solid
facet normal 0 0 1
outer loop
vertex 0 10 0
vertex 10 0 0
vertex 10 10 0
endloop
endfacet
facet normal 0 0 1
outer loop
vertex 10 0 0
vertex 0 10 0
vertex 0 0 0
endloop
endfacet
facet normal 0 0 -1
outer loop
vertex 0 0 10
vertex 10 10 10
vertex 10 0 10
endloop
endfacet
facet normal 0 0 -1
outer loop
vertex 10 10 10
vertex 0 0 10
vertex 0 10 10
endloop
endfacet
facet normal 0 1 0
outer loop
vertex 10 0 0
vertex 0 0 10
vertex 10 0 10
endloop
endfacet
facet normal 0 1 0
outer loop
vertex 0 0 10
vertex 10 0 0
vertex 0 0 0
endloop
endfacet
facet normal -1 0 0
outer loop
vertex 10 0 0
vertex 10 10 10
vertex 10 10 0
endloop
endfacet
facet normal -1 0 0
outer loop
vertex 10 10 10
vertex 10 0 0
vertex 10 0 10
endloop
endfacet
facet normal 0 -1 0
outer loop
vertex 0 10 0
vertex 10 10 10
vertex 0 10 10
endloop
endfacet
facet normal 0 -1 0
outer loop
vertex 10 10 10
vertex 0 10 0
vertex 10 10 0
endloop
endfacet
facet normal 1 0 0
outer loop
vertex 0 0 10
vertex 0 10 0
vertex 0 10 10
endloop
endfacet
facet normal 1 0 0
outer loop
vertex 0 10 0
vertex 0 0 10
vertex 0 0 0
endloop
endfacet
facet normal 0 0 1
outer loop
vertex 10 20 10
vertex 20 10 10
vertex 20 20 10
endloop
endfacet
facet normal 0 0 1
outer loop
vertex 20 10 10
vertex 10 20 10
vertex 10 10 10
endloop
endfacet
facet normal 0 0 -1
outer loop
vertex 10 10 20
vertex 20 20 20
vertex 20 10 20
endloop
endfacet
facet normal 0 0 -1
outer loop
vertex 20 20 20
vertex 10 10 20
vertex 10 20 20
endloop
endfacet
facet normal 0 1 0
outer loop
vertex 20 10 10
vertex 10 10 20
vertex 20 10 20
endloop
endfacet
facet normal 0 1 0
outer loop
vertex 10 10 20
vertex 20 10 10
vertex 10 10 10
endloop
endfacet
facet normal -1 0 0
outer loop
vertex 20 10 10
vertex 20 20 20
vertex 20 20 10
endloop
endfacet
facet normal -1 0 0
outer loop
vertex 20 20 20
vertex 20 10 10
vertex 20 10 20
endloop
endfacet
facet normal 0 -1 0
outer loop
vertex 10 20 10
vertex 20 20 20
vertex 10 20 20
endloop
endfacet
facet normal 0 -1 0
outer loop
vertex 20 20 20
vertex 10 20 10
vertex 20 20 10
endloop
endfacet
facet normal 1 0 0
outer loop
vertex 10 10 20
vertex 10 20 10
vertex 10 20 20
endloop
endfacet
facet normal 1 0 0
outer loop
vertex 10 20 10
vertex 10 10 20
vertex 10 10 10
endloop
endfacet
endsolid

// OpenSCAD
// a polyhedron that does not sew into one solid as written, built the way OpenSCAD repairs a mesh
// (one object per fixture: OpenSCAD's CGAL render refuses to union a non-manifold mesh with anything)
// two cubes meeting at one corner, each written with its own points: welded, they share that vertex
// and nothing else — two closed pieces, 2 x 1000 mm^3
polyhedron(
    points = [[0, 0, 0], [10, 0, 0], [10, 10, 0], [0, 10, 0], [0, 0, 10], [10, 0, 10], [10, 10, 10], [0, 10, 10],
              [10, 10, 10], [20, 10, 10], [20, 20, 10], [10, 20, 10], [10, 10, 20], [20, 10, 20], [20, 20, 20], [10, 20, 20]],
    faces = [[0, 3, 2, 1], [4, 5, 6, 7], [0, 1, 5, 4], [1, 2, 6, 5], [2, 3, 7, 6], [3, 0, 4, 7],
             [8, 11, 10, 9], [12, 13, 14, 15], [8, 9, 13, 12], [9, 10, 14, 13], [10, 11, 15, 14], [11, 8, 12, 15]]
);
